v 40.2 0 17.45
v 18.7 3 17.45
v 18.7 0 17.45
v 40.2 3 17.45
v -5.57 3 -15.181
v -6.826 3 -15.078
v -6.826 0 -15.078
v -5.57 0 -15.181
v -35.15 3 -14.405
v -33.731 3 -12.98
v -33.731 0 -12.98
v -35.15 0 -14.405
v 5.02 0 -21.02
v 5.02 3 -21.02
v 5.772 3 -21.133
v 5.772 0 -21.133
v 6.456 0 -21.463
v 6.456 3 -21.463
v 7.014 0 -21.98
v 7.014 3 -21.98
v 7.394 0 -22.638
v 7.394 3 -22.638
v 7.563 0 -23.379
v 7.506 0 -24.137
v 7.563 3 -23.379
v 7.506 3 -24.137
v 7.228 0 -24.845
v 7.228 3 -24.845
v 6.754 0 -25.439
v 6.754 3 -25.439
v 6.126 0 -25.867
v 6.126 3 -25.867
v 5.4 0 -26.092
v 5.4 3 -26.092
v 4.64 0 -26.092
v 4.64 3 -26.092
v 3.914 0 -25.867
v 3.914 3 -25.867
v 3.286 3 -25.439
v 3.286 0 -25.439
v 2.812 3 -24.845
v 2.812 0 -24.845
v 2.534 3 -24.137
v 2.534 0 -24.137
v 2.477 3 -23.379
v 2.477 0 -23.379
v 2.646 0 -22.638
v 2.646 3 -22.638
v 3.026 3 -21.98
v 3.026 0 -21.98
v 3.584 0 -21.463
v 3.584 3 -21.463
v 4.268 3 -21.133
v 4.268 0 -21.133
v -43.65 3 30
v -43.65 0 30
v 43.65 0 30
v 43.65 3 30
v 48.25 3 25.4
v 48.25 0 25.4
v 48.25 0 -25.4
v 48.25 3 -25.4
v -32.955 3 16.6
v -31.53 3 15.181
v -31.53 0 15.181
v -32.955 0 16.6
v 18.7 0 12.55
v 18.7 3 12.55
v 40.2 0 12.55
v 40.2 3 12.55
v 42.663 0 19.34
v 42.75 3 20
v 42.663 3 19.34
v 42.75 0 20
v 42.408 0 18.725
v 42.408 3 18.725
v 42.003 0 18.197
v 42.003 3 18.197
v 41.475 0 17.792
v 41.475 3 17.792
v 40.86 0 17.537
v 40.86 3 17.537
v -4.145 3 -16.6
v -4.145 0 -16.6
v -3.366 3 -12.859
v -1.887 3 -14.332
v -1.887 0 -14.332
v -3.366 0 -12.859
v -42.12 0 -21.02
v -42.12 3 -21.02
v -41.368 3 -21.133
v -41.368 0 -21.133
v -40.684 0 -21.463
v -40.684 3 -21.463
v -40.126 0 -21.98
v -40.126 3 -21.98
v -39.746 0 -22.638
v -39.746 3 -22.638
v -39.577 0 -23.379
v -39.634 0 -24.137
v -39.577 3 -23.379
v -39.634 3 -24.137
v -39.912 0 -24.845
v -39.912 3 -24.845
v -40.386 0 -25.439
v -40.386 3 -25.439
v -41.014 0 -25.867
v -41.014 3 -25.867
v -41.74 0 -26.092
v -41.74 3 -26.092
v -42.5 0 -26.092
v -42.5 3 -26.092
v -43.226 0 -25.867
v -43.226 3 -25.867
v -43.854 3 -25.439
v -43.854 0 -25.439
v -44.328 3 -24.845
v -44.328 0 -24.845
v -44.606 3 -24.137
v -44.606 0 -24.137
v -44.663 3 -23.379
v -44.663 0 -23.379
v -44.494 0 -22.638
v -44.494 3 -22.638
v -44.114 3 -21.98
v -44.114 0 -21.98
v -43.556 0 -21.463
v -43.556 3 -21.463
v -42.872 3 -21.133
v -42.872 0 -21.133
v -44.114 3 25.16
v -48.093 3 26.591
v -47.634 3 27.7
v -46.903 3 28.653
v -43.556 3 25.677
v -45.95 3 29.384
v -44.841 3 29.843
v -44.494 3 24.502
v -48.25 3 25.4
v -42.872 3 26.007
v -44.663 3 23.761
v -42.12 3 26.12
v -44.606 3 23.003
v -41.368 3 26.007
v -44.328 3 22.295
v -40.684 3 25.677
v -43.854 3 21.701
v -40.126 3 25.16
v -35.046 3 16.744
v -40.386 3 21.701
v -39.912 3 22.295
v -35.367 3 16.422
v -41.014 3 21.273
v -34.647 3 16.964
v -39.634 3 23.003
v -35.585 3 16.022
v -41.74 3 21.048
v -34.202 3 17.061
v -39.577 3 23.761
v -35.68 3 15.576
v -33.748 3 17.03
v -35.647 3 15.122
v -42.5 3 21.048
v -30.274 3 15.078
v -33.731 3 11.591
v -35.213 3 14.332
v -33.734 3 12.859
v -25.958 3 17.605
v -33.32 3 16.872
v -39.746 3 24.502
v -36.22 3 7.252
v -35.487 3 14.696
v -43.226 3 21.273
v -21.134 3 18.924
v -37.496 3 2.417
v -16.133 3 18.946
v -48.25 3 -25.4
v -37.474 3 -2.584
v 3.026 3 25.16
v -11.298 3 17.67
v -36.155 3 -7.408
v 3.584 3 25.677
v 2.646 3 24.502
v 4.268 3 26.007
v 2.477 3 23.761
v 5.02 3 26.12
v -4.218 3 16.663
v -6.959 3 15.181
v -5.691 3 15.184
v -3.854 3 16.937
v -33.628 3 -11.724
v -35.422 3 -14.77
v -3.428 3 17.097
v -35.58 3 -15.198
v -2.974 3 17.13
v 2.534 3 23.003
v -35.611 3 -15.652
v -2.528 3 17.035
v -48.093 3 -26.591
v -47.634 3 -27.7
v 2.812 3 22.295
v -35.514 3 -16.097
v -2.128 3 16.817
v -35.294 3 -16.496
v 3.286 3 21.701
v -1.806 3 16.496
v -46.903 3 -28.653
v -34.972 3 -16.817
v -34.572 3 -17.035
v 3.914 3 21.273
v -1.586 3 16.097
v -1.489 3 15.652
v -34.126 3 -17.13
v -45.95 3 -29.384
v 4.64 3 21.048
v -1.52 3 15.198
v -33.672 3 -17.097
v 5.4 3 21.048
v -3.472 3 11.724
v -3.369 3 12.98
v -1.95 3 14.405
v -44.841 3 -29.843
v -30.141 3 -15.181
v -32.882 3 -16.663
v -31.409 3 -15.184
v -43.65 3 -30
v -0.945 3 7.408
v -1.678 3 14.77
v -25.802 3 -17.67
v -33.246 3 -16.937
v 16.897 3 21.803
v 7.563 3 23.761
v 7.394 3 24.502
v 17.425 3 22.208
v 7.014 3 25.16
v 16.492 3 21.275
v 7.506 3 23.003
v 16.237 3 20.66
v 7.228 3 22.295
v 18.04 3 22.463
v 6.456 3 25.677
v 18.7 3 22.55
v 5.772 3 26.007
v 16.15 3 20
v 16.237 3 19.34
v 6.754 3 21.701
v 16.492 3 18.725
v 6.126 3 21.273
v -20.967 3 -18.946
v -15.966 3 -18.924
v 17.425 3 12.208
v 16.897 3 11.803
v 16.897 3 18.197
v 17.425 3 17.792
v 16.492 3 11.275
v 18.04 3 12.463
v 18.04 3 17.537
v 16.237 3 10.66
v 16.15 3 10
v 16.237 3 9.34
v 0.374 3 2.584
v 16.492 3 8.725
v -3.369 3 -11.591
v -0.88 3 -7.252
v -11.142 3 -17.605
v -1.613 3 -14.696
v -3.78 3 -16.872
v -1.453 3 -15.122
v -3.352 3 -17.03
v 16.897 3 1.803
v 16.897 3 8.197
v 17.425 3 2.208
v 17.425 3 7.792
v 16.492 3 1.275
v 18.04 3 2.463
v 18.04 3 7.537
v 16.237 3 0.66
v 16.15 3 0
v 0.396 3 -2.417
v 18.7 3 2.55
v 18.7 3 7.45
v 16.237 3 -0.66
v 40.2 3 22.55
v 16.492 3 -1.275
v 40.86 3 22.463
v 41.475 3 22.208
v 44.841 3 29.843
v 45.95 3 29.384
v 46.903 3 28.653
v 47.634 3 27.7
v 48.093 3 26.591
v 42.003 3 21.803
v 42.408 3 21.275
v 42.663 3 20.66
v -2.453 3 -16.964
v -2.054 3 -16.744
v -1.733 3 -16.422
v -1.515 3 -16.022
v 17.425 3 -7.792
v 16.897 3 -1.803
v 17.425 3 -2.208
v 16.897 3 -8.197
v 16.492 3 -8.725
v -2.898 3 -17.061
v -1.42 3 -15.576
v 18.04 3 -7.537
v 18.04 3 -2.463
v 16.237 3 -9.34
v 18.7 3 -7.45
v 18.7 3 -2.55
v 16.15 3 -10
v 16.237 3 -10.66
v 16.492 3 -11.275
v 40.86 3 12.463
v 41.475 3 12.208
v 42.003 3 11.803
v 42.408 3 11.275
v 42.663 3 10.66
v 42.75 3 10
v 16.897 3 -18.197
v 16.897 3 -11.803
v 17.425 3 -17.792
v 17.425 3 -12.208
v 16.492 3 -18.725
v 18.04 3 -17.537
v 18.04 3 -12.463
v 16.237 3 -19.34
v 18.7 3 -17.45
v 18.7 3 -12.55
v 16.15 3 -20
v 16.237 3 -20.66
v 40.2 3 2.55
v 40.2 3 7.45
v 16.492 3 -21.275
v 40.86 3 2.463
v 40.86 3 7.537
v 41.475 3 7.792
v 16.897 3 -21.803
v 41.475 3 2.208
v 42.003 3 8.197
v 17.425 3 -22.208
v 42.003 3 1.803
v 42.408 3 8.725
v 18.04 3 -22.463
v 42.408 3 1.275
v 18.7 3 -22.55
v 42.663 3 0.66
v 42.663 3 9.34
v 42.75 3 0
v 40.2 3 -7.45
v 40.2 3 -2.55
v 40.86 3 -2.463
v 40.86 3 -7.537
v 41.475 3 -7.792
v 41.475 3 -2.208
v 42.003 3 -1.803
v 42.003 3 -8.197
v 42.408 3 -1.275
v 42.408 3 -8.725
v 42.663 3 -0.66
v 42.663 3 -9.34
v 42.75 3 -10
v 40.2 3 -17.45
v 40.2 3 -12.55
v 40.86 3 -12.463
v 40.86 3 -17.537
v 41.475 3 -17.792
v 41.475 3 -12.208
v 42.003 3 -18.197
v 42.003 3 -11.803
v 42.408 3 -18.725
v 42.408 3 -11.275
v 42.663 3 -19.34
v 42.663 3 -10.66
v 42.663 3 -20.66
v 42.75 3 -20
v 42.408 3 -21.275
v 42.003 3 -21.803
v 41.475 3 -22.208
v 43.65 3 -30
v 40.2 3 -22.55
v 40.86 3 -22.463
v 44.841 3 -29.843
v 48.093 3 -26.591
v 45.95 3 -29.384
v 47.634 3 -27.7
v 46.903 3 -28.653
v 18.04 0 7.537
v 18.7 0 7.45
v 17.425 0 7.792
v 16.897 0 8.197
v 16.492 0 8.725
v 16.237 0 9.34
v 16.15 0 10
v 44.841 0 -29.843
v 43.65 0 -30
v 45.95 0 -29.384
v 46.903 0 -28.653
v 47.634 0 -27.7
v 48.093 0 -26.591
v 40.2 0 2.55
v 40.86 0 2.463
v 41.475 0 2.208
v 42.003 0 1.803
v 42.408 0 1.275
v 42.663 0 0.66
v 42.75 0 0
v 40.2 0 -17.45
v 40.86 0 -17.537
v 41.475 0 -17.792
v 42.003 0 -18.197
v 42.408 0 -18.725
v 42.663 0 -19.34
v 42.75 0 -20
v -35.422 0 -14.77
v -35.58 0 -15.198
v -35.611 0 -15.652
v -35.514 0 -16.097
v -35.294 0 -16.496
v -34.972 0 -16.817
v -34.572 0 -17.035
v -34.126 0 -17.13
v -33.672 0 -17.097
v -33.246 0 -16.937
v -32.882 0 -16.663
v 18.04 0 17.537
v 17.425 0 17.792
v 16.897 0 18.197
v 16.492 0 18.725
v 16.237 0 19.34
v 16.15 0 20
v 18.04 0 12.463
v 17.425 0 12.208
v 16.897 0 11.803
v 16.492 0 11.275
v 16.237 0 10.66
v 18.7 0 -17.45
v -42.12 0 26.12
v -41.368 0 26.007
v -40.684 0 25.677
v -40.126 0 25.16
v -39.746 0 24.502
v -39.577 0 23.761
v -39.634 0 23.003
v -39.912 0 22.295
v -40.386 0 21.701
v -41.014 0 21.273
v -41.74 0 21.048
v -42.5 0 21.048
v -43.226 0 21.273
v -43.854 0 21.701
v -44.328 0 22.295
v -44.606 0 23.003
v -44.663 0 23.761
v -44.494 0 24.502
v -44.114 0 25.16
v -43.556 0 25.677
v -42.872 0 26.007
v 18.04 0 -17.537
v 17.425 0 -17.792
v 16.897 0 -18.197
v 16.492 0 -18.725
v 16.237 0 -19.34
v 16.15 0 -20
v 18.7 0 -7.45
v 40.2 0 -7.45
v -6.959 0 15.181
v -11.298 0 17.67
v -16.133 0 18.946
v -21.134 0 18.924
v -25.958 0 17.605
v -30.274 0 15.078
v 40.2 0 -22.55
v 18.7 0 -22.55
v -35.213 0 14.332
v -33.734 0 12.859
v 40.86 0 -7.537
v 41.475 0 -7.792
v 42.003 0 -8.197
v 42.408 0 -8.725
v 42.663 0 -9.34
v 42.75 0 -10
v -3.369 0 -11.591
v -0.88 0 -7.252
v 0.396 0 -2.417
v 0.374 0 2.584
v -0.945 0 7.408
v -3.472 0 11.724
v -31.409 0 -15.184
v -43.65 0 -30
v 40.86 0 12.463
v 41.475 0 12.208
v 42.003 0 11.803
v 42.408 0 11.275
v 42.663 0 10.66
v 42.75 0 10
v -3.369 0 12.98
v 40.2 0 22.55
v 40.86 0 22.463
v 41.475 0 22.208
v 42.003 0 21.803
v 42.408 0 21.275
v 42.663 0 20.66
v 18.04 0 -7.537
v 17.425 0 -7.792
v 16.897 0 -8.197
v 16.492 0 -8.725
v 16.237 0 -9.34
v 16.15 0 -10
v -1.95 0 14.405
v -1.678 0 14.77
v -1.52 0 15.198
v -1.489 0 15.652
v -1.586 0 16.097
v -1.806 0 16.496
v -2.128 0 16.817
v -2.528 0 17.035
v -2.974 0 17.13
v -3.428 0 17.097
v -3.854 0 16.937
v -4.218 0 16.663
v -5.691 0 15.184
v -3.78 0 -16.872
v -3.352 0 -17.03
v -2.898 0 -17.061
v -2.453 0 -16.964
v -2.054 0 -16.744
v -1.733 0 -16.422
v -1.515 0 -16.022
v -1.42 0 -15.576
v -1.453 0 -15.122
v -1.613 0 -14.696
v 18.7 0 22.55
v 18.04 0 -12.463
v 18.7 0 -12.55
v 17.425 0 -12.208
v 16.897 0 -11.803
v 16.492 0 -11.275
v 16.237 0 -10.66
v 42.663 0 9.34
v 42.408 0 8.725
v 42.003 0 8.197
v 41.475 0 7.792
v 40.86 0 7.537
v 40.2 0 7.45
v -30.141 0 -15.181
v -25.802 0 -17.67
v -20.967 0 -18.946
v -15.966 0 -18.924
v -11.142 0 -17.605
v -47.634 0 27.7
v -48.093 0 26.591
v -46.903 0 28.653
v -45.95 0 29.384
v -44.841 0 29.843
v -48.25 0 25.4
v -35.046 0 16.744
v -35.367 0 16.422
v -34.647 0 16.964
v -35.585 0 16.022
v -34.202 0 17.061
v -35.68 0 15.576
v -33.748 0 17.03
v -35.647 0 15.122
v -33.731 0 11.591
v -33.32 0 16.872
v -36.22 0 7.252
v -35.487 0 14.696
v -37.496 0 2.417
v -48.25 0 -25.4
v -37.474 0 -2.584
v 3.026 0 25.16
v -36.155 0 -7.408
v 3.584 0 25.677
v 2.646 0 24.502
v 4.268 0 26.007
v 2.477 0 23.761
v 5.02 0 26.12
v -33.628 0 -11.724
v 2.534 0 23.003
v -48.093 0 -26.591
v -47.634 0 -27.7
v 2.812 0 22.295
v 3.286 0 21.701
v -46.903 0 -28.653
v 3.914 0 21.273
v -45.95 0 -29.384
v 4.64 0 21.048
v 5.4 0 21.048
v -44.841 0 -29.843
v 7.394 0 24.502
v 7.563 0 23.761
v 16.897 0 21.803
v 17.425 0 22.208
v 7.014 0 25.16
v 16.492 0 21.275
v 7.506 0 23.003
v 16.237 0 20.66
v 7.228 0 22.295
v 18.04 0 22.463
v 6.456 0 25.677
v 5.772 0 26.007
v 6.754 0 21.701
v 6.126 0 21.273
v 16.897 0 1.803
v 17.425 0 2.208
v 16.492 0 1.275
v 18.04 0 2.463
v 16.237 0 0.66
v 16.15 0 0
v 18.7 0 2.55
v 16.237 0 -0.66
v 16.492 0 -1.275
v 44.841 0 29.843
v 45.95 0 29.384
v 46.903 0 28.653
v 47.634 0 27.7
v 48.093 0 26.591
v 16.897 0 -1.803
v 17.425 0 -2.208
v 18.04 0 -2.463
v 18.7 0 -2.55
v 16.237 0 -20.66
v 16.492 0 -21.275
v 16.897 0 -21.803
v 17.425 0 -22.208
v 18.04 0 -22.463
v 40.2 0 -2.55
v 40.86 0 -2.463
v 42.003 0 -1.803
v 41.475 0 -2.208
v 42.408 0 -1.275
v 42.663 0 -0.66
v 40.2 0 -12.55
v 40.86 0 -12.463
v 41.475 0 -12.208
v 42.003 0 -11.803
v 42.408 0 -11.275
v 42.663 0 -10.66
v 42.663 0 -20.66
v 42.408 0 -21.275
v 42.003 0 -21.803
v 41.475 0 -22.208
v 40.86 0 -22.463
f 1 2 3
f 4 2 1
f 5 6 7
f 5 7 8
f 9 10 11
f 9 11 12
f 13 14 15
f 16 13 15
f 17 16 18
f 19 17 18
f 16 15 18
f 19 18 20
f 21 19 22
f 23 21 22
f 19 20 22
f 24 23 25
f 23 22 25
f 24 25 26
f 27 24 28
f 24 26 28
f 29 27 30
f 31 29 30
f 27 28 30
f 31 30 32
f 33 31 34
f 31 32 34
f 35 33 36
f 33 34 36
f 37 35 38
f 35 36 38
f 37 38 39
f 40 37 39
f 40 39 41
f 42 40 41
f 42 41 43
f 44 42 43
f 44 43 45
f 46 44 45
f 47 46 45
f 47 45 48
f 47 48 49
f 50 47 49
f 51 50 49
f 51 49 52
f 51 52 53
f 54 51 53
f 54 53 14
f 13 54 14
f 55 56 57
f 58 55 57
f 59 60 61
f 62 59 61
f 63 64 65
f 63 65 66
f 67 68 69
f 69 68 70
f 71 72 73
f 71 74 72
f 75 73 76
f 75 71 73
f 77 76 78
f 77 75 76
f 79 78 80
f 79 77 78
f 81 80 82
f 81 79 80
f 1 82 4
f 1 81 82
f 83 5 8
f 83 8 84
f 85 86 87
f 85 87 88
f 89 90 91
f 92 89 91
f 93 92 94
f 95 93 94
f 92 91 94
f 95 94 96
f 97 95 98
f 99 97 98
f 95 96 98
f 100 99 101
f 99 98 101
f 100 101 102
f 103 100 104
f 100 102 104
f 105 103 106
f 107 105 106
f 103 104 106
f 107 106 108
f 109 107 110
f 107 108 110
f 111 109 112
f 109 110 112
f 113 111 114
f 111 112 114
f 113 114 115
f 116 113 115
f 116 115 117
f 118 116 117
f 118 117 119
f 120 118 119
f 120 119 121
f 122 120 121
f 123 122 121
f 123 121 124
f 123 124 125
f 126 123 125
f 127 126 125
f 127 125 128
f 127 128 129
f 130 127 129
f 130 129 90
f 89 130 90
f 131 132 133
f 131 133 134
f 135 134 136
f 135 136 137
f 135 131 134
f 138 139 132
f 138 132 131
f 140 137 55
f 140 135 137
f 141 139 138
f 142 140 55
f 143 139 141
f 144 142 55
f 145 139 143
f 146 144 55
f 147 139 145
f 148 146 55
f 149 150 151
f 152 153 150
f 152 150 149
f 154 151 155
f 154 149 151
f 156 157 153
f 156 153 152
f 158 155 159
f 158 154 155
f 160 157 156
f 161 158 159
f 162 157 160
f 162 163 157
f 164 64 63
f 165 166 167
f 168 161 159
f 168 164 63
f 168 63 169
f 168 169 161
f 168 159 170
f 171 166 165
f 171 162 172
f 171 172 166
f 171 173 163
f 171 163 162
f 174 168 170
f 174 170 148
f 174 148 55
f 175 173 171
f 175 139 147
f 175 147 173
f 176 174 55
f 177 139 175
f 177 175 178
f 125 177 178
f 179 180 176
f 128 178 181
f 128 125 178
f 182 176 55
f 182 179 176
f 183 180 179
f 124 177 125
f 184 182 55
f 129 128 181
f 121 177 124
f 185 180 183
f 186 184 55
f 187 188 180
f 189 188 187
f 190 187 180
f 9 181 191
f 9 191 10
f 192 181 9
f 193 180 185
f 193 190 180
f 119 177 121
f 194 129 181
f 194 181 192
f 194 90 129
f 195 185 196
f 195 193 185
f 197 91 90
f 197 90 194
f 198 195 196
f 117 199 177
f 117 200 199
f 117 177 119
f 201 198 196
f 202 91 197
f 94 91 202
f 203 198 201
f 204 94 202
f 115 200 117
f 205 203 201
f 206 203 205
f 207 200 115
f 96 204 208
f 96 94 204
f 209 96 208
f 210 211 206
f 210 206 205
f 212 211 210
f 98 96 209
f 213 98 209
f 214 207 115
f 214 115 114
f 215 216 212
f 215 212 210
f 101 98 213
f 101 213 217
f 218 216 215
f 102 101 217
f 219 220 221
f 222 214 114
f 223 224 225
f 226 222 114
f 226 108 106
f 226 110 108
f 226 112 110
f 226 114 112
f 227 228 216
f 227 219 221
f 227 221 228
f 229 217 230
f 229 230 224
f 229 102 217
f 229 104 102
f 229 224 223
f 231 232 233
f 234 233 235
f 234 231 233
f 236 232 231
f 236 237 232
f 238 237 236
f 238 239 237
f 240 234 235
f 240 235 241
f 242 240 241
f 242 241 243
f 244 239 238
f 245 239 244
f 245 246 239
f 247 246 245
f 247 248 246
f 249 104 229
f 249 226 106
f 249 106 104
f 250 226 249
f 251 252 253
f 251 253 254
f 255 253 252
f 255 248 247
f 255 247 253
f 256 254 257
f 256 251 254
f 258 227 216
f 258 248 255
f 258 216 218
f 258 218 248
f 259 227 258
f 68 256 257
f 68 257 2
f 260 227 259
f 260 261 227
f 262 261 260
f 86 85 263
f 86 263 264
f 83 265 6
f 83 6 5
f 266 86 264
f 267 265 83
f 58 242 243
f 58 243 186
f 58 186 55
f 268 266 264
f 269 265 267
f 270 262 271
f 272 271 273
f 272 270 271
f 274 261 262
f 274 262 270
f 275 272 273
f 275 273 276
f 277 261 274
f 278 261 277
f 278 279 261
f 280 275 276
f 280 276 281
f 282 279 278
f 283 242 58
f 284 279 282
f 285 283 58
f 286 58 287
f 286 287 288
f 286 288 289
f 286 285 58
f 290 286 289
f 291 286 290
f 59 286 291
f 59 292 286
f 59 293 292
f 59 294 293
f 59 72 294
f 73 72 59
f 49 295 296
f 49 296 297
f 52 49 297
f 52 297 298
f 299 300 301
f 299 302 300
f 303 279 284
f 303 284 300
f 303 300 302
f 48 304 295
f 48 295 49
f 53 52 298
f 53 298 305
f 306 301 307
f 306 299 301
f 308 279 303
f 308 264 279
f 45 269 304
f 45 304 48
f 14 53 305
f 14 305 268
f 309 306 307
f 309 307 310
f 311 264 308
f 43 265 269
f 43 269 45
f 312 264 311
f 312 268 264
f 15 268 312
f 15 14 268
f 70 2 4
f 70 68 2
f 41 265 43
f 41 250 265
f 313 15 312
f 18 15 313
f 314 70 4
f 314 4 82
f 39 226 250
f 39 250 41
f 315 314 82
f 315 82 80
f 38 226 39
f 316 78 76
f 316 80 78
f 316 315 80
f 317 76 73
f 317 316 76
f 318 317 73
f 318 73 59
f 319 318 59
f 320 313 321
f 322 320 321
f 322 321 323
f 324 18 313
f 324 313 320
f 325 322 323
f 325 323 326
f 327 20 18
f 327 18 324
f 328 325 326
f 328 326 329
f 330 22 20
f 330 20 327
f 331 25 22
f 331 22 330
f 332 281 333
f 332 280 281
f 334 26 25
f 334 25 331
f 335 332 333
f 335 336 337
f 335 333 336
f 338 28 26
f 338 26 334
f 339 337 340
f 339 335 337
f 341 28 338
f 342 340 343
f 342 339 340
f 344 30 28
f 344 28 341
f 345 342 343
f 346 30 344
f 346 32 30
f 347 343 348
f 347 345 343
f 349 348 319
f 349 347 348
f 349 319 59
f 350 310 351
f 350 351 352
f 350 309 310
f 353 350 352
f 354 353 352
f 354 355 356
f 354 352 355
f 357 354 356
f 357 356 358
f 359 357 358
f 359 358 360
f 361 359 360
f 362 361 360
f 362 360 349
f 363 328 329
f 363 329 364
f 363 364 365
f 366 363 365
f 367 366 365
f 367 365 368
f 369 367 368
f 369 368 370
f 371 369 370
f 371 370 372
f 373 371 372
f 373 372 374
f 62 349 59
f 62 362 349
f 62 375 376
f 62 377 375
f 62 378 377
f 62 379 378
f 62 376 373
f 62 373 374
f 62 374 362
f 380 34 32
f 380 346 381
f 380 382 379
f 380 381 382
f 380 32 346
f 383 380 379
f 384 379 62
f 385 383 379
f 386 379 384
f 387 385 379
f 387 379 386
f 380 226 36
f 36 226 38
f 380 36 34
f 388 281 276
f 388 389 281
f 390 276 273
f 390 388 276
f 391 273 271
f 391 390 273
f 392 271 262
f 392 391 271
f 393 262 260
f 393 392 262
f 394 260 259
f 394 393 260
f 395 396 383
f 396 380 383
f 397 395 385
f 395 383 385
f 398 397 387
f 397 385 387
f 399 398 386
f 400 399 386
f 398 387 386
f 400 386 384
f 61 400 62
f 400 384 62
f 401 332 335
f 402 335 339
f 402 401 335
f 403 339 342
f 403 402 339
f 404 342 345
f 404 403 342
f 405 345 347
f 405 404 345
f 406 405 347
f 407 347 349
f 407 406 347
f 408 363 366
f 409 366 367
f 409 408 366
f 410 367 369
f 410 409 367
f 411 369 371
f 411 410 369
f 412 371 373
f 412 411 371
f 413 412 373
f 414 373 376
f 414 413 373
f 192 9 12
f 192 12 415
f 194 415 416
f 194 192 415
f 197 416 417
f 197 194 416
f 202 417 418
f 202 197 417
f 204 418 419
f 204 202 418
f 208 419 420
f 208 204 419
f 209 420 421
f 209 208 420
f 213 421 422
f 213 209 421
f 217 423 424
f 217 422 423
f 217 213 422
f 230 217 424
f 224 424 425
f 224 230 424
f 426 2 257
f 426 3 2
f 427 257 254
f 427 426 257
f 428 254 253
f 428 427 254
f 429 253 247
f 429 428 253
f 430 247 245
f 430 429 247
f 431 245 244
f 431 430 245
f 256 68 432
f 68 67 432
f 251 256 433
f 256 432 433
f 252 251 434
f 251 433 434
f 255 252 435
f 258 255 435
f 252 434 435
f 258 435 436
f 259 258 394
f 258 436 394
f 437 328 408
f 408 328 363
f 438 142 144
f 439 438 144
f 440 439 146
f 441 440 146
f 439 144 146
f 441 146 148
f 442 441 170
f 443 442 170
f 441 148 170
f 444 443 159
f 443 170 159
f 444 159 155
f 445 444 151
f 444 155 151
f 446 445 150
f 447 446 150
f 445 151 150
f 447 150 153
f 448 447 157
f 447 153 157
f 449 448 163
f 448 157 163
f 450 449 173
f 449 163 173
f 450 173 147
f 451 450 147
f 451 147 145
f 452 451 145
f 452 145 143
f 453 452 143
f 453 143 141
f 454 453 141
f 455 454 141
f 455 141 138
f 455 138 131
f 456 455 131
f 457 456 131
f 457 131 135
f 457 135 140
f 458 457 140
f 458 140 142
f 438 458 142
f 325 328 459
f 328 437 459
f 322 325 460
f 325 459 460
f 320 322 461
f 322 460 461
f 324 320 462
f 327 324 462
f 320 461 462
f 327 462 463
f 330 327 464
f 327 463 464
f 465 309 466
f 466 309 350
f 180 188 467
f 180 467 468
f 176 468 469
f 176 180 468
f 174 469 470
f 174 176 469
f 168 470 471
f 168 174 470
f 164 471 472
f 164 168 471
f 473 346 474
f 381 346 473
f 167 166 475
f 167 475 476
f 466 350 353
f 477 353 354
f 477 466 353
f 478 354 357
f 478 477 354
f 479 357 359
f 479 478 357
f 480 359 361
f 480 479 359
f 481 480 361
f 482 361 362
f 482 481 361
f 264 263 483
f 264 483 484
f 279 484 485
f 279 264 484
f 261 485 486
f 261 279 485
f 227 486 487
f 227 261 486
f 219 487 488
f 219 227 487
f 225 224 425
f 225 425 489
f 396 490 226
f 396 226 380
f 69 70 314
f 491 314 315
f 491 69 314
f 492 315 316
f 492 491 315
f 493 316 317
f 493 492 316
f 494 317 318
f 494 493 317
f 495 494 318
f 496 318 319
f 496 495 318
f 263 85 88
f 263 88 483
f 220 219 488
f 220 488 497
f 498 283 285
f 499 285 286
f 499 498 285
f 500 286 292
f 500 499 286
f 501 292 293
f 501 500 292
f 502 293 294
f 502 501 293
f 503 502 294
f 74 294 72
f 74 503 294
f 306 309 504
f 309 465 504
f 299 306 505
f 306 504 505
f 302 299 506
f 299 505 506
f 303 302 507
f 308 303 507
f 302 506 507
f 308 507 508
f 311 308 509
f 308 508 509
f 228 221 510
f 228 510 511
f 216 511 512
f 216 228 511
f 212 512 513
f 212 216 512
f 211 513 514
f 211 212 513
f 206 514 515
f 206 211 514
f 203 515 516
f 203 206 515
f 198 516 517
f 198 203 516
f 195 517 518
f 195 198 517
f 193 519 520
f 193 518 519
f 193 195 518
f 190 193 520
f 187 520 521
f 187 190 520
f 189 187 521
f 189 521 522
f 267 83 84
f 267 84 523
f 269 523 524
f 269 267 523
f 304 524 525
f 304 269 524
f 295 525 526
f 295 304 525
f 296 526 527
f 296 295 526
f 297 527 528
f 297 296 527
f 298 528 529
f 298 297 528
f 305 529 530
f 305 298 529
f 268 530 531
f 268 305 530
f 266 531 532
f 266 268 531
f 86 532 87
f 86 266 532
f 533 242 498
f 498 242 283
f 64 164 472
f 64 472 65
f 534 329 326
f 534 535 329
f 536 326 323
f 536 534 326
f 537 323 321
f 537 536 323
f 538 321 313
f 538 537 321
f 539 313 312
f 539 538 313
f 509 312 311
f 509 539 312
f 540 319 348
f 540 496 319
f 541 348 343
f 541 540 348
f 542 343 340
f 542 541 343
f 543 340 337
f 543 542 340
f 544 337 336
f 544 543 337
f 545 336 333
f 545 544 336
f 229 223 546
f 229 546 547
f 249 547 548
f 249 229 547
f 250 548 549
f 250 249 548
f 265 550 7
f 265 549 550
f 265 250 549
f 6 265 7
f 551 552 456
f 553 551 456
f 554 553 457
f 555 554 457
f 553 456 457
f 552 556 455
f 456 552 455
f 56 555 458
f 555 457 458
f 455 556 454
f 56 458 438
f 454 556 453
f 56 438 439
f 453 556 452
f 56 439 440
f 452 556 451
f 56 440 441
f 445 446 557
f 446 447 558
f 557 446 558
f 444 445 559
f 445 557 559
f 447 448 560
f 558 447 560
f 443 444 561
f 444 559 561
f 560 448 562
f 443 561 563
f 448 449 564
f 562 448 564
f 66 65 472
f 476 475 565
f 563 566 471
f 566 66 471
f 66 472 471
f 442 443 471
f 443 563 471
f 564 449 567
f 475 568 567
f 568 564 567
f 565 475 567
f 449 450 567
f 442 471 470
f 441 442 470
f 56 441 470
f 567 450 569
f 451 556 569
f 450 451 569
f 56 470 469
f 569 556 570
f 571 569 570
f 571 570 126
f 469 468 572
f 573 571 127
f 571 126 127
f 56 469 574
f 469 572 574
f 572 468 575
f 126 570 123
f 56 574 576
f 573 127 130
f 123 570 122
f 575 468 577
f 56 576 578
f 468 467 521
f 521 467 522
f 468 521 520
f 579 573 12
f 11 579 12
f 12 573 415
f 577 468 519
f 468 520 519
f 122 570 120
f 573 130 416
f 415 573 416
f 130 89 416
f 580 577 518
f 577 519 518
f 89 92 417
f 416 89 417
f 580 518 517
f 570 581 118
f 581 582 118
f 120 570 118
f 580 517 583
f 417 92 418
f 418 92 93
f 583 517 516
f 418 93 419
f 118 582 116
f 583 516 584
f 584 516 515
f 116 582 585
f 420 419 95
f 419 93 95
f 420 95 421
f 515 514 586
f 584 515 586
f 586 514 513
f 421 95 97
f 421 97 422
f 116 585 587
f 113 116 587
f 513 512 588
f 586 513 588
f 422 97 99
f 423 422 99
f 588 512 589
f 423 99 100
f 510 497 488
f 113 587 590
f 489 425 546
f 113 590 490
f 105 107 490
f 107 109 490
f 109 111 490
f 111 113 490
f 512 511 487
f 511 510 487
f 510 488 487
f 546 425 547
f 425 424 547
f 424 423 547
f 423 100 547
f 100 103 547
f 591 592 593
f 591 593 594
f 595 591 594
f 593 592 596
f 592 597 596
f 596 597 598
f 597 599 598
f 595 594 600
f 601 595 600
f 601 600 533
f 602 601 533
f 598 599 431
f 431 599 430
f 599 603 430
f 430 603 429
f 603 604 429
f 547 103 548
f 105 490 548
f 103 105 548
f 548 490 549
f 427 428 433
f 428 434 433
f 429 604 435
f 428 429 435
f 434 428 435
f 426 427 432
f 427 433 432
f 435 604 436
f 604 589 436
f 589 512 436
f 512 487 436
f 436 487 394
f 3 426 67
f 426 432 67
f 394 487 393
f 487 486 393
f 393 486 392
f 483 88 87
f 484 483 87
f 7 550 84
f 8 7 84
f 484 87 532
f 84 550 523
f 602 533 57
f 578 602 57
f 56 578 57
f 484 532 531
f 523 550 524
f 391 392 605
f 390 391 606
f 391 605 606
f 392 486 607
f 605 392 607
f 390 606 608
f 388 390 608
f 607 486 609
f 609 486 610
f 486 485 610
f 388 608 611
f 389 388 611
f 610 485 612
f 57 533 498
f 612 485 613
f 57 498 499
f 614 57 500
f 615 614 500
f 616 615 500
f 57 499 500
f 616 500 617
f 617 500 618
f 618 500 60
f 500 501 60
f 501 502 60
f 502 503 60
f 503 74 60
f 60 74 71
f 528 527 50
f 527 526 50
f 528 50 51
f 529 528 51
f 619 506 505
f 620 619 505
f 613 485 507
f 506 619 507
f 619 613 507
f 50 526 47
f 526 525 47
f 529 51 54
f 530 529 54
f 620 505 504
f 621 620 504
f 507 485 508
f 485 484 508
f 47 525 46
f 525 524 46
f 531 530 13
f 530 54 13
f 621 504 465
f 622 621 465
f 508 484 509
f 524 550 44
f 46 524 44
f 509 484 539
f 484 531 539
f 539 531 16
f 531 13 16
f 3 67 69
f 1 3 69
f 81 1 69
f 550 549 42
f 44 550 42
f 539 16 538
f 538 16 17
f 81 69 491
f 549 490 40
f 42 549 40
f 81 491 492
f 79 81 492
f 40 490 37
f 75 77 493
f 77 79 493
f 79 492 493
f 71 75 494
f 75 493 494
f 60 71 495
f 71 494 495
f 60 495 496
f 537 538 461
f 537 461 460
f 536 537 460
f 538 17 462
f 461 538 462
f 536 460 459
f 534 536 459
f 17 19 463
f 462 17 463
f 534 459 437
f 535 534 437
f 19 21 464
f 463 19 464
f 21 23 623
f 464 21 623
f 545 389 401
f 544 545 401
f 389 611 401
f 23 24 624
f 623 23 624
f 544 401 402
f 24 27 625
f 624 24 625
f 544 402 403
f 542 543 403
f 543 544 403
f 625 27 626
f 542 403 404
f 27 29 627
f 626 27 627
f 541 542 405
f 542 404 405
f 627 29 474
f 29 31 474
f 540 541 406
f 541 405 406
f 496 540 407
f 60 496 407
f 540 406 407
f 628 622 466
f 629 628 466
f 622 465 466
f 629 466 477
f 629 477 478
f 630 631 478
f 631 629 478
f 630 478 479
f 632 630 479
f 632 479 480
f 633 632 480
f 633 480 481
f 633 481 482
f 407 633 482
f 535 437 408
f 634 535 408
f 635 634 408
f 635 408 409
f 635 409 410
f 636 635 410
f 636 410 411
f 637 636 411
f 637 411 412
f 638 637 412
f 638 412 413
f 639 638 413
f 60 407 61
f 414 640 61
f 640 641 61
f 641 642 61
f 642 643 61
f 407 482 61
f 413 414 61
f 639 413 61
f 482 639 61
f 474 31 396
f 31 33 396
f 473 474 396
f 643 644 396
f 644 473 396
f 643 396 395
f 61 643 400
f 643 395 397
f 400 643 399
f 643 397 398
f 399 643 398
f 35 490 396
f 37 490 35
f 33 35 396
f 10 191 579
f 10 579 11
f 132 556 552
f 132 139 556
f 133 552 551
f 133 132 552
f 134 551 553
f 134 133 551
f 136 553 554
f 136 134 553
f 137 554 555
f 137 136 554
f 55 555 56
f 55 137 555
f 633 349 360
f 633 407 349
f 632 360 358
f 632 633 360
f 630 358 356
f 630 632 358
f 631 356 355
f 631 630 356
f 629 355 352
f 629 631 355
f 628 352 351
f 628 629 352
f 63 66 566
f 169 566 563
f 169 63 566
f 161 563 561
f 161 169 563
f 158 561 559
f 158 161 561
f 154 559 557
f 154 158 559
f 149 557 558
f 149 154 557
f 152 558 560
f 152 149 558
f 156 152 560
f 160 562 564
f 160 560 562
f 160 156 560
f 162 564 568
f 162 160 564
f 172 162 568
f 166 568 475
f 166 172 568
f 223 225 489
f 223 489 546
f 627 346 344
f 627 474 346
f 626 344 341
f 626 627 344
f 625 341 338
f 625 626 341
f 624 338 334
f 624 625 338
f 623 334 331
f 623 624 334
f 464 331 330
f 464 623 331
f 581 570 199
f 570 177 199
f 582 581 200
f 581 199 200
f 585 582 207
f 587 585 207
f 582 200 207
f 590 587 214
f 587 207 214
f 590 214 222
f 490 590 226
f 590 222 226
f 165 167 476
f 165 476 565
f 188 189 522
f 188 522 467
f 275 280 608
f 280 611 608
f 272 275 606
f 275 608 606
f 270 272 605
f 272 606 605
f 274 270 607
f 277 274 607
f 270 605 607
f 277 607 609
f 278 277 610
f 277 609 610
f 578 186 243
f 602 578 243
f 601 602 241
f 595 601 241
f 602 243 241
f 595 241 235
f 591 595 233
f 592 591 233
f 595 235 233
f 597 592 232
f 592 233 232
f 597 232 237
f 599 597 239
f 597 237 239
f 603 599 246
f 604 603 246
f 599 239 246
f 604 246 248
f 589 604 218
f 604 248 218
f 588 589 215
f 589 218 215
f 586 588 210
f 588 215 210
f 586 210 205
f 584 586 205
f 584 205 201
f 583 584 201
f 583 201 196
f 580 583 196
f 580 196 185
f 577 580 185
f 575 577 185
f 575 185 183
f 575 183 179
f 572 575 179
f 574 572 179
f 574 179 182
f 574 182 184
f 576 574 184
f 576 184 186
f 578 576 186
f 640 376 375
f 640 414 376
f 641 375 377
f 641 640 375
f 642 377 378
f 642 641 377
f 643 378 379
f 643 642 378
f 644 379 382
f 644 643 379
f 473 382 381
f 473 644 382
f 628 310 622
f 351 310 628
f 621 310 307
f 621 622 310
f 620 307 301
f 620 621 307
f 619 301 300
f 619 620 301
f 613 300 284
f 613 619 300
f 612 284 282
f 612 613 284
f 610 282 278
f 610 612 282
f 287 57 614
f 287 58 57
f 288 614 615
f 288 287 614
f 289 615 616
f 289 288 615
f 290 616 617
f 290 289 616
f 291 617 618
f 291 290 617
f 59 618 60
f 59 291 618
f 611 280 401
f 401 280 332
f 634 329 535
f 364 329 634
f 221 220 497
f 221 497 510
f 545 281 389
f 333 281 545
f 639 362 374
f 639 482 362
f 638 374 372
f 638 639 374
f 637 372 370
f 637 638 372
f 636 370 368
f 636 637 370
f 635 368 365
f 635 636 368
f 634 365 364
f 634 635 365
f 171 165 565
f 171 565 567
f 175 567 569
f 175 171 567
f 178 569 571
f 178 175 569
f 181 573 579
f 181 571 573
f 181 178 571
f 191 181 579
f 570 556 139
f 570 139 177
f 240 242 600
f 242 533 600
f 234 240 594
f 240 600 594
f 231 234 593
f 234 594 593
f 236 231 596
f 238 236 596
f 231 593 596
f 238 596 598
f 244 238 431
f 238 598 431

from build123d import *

# Parameters (mm, degrees)
SKETCH1_W           = 96.5
SKETCH1_H           = 60
BOSS_EXTRUDE1_DEPTH = 3
SKETCH2_R           = 2.55
SKETCH2_W           = 26.6
SKETCH2_H           = 5.1
CUT_EXTRUDE1_DEPTH  = 57.895188725
FILLET1_R           = 2.55
FILLET2_R           = 4.6


with BuildPart() as part:
    # Sketch1 → Boss-Extrude1 (new body)
    with BuildSketch(Plane(origin=(0, 0, 0), x_dir=(1, 0, 0), z_dir=(0, 1, 0))):
        Rectangle(SKETCH1_W, SKETCH1_H)
    extrude(amount=BOSS_EXTRUDE1_DEPTH)

    # Sketch2 → Cut-Extrude1 (cut, through all)
    with BuildSketch(Plane(origin=(0, 3, 0), x_dir=(1, 0, 0), z_dir=(0, 1, 0))):
        with Locations(Location((-42.12, 23.57, 0), (0, 0, 270))):
            Circle(SKETCH2_R)
        with Locations(Location((5.02, 23.57, 0), (0, 0, 270))):
            Circle(SKETCH2_R)
        with Locations(Location((5.02, -23.57, 0), (0, 0, 270))):
            Circle(SKETCH2_R)
        with Locations(Location((-42.12, -23.57, 0), (0, 0, 270))):
            Circle(SKETCH2_R)
        with Locations((29.45, 20)):
            Rectangle(SKETCH2_W, SKETCH2_H)
        with Locations((29.45, 10)):
            Rectangle(SKETCH2_W, SKETCH2_H)
        with Locations((29.45, 0)):
            Rectangle(SKETCH2_W, SKETCH2_H)
        with Locations((29.45, -10)):
            Rectangle(SKETCH2_W, SKETCH2_H)
        with Locations((29.45, -20)):
            Rectangle(SKETCH2_W, SKETCH2_H)
        with BuildLine():
            Line((-5.569839705, 15.180766292), (-4.144713605, 16.599616741))
            ThreePointArc((-4.144713605, 16.599616741), (-1.881977414, 16.594623682), (-1.886970473, 14.331887491))
            Line((-1.886970473, 14.331887491), (-3.365955143, 12.859415643))
            Line((-3.365955143, 12.859415643), (-3.36875518, 11.590504981))
            ThreePointArc((-3.36875518, 11.590504981), (0.549812749, -0.084575096), (-3.471995372, -11.72449472))
            Line((-3.471995372, -11.72449472), (-3.369233708, -12.980160295))
            Line((-3.369233708, -12.980160295), (-1.950383259, -14.405286395))
            ThreePointArc((-1.950383259, -14.405286395), (-1.955376318, -16.668022586), (-4.218112509, -16.663029527))
            Line((-4.218112509, -16.663029527), (-5.690584357, -15.184044857))
            Line((-5.690584357, -15.184044857), (-6.959495019, -15.18124482))
            ThreePointArc((-6.959495019, -15.18124482), (-18.634575096, -19.099812749), (-30.27449472, -15.078004628))
            Line((-30.27449472, -15.078004628), (-31.530160295, -15.180766292))
            Line((-31.530160295, -15.180766292), (-32.955286395, -16.599616741))
            ThreePointArc((-32.955286395, -16.599616741), (-35.218022586, -16.594623682), (-35.213029527, -14.331887491))
            Line((-35.213029527, -14.331887491), (-33.734044857, -12.859415643))
            Line((-33.734044857, -12.859415643), (-33.73124482, -11.590504981))
            ThreePointArc((-33.73124482, -11.590504981), (-37.649812749, 0.084575096), (-33.628004628, 11.72449472))
            Line((-33.628004628, 11.72449472), (-33.730766292, 12.980160295))
            Line((-33.730766292, 12.980160295), (-35.149616741, 14.405286395))
            ThreePointArc((-35.149616741, 14.405286395), (-35.144623682, 16.668022586), (-32.881887491, 16.663029527))
            Line((-32.881887491, 16.663029527), (-31.409415643, 15.184044857))
            Line((-31.409415643, 15.184044857), (-30.140504981, 15.18124482))
            ThreePointArc((-30.140504981, 15.18124482), (-18.465424904, 19.099812749), (-6.82550528, 15.078004628))
            Line((-6.82550528, 15.078004628), (-5.569839705, 15.180766292))
        make_face()
    extrude(amount=-CUT_EXTRUDE1_DEPTH, mode=Mode.SUBTRACT)

    # Fillet1
    fillet1_edges = [part.edges().sort_by_distance(p)[0] for p in [
        (42.75, 1.5, 12.55),
        (42.75, 1.5, 22.55),
        (42.75, 1.5, 17.45),
        (42.75, 1.5, 7.45),
        (42.75, 1.5, 2.55),
        (42.75, 1.5, -2.55),
        (42.75, 1.5, -7.45),
        (42.75, 1.5, -12.55),
        (42.75, 1.5, -17.45),
        (42.75, 1.5, -22.55),
        (16.15, 1.5, -17.45),
        (16.15, 1.5, -22.55),
        (16.15, 1.5, 22.55),
        (16.15, 1.5, 17.45),
        (16.15, 1.5, 12.55),
        (16.15, 1.5, 7.45),
        (16.15, 1.5, 2.55),
        (16.15, 1.5, -2.55),
        (16.15, 1.5, -7.45),
        (16.15, 1.5, -12.55),
    ]]
    fillet(fillet1_edges, radius=FILLET1_R - 0.0001)  # a hair under: the kernel refuses the full size

    # Fillet2
    fillet2_edges = [part.edges().sort_by_distance(p)[0] for p in [
        (-48.25, 1.5, -30),
        (48.25, 1.5, -30),
        (48.25, 1.5, 30),
        (-48.25, 1.5, 30),
    ]]
    fillet(fillet2_edges, radius=FILLET2_R)


solid = part.part
